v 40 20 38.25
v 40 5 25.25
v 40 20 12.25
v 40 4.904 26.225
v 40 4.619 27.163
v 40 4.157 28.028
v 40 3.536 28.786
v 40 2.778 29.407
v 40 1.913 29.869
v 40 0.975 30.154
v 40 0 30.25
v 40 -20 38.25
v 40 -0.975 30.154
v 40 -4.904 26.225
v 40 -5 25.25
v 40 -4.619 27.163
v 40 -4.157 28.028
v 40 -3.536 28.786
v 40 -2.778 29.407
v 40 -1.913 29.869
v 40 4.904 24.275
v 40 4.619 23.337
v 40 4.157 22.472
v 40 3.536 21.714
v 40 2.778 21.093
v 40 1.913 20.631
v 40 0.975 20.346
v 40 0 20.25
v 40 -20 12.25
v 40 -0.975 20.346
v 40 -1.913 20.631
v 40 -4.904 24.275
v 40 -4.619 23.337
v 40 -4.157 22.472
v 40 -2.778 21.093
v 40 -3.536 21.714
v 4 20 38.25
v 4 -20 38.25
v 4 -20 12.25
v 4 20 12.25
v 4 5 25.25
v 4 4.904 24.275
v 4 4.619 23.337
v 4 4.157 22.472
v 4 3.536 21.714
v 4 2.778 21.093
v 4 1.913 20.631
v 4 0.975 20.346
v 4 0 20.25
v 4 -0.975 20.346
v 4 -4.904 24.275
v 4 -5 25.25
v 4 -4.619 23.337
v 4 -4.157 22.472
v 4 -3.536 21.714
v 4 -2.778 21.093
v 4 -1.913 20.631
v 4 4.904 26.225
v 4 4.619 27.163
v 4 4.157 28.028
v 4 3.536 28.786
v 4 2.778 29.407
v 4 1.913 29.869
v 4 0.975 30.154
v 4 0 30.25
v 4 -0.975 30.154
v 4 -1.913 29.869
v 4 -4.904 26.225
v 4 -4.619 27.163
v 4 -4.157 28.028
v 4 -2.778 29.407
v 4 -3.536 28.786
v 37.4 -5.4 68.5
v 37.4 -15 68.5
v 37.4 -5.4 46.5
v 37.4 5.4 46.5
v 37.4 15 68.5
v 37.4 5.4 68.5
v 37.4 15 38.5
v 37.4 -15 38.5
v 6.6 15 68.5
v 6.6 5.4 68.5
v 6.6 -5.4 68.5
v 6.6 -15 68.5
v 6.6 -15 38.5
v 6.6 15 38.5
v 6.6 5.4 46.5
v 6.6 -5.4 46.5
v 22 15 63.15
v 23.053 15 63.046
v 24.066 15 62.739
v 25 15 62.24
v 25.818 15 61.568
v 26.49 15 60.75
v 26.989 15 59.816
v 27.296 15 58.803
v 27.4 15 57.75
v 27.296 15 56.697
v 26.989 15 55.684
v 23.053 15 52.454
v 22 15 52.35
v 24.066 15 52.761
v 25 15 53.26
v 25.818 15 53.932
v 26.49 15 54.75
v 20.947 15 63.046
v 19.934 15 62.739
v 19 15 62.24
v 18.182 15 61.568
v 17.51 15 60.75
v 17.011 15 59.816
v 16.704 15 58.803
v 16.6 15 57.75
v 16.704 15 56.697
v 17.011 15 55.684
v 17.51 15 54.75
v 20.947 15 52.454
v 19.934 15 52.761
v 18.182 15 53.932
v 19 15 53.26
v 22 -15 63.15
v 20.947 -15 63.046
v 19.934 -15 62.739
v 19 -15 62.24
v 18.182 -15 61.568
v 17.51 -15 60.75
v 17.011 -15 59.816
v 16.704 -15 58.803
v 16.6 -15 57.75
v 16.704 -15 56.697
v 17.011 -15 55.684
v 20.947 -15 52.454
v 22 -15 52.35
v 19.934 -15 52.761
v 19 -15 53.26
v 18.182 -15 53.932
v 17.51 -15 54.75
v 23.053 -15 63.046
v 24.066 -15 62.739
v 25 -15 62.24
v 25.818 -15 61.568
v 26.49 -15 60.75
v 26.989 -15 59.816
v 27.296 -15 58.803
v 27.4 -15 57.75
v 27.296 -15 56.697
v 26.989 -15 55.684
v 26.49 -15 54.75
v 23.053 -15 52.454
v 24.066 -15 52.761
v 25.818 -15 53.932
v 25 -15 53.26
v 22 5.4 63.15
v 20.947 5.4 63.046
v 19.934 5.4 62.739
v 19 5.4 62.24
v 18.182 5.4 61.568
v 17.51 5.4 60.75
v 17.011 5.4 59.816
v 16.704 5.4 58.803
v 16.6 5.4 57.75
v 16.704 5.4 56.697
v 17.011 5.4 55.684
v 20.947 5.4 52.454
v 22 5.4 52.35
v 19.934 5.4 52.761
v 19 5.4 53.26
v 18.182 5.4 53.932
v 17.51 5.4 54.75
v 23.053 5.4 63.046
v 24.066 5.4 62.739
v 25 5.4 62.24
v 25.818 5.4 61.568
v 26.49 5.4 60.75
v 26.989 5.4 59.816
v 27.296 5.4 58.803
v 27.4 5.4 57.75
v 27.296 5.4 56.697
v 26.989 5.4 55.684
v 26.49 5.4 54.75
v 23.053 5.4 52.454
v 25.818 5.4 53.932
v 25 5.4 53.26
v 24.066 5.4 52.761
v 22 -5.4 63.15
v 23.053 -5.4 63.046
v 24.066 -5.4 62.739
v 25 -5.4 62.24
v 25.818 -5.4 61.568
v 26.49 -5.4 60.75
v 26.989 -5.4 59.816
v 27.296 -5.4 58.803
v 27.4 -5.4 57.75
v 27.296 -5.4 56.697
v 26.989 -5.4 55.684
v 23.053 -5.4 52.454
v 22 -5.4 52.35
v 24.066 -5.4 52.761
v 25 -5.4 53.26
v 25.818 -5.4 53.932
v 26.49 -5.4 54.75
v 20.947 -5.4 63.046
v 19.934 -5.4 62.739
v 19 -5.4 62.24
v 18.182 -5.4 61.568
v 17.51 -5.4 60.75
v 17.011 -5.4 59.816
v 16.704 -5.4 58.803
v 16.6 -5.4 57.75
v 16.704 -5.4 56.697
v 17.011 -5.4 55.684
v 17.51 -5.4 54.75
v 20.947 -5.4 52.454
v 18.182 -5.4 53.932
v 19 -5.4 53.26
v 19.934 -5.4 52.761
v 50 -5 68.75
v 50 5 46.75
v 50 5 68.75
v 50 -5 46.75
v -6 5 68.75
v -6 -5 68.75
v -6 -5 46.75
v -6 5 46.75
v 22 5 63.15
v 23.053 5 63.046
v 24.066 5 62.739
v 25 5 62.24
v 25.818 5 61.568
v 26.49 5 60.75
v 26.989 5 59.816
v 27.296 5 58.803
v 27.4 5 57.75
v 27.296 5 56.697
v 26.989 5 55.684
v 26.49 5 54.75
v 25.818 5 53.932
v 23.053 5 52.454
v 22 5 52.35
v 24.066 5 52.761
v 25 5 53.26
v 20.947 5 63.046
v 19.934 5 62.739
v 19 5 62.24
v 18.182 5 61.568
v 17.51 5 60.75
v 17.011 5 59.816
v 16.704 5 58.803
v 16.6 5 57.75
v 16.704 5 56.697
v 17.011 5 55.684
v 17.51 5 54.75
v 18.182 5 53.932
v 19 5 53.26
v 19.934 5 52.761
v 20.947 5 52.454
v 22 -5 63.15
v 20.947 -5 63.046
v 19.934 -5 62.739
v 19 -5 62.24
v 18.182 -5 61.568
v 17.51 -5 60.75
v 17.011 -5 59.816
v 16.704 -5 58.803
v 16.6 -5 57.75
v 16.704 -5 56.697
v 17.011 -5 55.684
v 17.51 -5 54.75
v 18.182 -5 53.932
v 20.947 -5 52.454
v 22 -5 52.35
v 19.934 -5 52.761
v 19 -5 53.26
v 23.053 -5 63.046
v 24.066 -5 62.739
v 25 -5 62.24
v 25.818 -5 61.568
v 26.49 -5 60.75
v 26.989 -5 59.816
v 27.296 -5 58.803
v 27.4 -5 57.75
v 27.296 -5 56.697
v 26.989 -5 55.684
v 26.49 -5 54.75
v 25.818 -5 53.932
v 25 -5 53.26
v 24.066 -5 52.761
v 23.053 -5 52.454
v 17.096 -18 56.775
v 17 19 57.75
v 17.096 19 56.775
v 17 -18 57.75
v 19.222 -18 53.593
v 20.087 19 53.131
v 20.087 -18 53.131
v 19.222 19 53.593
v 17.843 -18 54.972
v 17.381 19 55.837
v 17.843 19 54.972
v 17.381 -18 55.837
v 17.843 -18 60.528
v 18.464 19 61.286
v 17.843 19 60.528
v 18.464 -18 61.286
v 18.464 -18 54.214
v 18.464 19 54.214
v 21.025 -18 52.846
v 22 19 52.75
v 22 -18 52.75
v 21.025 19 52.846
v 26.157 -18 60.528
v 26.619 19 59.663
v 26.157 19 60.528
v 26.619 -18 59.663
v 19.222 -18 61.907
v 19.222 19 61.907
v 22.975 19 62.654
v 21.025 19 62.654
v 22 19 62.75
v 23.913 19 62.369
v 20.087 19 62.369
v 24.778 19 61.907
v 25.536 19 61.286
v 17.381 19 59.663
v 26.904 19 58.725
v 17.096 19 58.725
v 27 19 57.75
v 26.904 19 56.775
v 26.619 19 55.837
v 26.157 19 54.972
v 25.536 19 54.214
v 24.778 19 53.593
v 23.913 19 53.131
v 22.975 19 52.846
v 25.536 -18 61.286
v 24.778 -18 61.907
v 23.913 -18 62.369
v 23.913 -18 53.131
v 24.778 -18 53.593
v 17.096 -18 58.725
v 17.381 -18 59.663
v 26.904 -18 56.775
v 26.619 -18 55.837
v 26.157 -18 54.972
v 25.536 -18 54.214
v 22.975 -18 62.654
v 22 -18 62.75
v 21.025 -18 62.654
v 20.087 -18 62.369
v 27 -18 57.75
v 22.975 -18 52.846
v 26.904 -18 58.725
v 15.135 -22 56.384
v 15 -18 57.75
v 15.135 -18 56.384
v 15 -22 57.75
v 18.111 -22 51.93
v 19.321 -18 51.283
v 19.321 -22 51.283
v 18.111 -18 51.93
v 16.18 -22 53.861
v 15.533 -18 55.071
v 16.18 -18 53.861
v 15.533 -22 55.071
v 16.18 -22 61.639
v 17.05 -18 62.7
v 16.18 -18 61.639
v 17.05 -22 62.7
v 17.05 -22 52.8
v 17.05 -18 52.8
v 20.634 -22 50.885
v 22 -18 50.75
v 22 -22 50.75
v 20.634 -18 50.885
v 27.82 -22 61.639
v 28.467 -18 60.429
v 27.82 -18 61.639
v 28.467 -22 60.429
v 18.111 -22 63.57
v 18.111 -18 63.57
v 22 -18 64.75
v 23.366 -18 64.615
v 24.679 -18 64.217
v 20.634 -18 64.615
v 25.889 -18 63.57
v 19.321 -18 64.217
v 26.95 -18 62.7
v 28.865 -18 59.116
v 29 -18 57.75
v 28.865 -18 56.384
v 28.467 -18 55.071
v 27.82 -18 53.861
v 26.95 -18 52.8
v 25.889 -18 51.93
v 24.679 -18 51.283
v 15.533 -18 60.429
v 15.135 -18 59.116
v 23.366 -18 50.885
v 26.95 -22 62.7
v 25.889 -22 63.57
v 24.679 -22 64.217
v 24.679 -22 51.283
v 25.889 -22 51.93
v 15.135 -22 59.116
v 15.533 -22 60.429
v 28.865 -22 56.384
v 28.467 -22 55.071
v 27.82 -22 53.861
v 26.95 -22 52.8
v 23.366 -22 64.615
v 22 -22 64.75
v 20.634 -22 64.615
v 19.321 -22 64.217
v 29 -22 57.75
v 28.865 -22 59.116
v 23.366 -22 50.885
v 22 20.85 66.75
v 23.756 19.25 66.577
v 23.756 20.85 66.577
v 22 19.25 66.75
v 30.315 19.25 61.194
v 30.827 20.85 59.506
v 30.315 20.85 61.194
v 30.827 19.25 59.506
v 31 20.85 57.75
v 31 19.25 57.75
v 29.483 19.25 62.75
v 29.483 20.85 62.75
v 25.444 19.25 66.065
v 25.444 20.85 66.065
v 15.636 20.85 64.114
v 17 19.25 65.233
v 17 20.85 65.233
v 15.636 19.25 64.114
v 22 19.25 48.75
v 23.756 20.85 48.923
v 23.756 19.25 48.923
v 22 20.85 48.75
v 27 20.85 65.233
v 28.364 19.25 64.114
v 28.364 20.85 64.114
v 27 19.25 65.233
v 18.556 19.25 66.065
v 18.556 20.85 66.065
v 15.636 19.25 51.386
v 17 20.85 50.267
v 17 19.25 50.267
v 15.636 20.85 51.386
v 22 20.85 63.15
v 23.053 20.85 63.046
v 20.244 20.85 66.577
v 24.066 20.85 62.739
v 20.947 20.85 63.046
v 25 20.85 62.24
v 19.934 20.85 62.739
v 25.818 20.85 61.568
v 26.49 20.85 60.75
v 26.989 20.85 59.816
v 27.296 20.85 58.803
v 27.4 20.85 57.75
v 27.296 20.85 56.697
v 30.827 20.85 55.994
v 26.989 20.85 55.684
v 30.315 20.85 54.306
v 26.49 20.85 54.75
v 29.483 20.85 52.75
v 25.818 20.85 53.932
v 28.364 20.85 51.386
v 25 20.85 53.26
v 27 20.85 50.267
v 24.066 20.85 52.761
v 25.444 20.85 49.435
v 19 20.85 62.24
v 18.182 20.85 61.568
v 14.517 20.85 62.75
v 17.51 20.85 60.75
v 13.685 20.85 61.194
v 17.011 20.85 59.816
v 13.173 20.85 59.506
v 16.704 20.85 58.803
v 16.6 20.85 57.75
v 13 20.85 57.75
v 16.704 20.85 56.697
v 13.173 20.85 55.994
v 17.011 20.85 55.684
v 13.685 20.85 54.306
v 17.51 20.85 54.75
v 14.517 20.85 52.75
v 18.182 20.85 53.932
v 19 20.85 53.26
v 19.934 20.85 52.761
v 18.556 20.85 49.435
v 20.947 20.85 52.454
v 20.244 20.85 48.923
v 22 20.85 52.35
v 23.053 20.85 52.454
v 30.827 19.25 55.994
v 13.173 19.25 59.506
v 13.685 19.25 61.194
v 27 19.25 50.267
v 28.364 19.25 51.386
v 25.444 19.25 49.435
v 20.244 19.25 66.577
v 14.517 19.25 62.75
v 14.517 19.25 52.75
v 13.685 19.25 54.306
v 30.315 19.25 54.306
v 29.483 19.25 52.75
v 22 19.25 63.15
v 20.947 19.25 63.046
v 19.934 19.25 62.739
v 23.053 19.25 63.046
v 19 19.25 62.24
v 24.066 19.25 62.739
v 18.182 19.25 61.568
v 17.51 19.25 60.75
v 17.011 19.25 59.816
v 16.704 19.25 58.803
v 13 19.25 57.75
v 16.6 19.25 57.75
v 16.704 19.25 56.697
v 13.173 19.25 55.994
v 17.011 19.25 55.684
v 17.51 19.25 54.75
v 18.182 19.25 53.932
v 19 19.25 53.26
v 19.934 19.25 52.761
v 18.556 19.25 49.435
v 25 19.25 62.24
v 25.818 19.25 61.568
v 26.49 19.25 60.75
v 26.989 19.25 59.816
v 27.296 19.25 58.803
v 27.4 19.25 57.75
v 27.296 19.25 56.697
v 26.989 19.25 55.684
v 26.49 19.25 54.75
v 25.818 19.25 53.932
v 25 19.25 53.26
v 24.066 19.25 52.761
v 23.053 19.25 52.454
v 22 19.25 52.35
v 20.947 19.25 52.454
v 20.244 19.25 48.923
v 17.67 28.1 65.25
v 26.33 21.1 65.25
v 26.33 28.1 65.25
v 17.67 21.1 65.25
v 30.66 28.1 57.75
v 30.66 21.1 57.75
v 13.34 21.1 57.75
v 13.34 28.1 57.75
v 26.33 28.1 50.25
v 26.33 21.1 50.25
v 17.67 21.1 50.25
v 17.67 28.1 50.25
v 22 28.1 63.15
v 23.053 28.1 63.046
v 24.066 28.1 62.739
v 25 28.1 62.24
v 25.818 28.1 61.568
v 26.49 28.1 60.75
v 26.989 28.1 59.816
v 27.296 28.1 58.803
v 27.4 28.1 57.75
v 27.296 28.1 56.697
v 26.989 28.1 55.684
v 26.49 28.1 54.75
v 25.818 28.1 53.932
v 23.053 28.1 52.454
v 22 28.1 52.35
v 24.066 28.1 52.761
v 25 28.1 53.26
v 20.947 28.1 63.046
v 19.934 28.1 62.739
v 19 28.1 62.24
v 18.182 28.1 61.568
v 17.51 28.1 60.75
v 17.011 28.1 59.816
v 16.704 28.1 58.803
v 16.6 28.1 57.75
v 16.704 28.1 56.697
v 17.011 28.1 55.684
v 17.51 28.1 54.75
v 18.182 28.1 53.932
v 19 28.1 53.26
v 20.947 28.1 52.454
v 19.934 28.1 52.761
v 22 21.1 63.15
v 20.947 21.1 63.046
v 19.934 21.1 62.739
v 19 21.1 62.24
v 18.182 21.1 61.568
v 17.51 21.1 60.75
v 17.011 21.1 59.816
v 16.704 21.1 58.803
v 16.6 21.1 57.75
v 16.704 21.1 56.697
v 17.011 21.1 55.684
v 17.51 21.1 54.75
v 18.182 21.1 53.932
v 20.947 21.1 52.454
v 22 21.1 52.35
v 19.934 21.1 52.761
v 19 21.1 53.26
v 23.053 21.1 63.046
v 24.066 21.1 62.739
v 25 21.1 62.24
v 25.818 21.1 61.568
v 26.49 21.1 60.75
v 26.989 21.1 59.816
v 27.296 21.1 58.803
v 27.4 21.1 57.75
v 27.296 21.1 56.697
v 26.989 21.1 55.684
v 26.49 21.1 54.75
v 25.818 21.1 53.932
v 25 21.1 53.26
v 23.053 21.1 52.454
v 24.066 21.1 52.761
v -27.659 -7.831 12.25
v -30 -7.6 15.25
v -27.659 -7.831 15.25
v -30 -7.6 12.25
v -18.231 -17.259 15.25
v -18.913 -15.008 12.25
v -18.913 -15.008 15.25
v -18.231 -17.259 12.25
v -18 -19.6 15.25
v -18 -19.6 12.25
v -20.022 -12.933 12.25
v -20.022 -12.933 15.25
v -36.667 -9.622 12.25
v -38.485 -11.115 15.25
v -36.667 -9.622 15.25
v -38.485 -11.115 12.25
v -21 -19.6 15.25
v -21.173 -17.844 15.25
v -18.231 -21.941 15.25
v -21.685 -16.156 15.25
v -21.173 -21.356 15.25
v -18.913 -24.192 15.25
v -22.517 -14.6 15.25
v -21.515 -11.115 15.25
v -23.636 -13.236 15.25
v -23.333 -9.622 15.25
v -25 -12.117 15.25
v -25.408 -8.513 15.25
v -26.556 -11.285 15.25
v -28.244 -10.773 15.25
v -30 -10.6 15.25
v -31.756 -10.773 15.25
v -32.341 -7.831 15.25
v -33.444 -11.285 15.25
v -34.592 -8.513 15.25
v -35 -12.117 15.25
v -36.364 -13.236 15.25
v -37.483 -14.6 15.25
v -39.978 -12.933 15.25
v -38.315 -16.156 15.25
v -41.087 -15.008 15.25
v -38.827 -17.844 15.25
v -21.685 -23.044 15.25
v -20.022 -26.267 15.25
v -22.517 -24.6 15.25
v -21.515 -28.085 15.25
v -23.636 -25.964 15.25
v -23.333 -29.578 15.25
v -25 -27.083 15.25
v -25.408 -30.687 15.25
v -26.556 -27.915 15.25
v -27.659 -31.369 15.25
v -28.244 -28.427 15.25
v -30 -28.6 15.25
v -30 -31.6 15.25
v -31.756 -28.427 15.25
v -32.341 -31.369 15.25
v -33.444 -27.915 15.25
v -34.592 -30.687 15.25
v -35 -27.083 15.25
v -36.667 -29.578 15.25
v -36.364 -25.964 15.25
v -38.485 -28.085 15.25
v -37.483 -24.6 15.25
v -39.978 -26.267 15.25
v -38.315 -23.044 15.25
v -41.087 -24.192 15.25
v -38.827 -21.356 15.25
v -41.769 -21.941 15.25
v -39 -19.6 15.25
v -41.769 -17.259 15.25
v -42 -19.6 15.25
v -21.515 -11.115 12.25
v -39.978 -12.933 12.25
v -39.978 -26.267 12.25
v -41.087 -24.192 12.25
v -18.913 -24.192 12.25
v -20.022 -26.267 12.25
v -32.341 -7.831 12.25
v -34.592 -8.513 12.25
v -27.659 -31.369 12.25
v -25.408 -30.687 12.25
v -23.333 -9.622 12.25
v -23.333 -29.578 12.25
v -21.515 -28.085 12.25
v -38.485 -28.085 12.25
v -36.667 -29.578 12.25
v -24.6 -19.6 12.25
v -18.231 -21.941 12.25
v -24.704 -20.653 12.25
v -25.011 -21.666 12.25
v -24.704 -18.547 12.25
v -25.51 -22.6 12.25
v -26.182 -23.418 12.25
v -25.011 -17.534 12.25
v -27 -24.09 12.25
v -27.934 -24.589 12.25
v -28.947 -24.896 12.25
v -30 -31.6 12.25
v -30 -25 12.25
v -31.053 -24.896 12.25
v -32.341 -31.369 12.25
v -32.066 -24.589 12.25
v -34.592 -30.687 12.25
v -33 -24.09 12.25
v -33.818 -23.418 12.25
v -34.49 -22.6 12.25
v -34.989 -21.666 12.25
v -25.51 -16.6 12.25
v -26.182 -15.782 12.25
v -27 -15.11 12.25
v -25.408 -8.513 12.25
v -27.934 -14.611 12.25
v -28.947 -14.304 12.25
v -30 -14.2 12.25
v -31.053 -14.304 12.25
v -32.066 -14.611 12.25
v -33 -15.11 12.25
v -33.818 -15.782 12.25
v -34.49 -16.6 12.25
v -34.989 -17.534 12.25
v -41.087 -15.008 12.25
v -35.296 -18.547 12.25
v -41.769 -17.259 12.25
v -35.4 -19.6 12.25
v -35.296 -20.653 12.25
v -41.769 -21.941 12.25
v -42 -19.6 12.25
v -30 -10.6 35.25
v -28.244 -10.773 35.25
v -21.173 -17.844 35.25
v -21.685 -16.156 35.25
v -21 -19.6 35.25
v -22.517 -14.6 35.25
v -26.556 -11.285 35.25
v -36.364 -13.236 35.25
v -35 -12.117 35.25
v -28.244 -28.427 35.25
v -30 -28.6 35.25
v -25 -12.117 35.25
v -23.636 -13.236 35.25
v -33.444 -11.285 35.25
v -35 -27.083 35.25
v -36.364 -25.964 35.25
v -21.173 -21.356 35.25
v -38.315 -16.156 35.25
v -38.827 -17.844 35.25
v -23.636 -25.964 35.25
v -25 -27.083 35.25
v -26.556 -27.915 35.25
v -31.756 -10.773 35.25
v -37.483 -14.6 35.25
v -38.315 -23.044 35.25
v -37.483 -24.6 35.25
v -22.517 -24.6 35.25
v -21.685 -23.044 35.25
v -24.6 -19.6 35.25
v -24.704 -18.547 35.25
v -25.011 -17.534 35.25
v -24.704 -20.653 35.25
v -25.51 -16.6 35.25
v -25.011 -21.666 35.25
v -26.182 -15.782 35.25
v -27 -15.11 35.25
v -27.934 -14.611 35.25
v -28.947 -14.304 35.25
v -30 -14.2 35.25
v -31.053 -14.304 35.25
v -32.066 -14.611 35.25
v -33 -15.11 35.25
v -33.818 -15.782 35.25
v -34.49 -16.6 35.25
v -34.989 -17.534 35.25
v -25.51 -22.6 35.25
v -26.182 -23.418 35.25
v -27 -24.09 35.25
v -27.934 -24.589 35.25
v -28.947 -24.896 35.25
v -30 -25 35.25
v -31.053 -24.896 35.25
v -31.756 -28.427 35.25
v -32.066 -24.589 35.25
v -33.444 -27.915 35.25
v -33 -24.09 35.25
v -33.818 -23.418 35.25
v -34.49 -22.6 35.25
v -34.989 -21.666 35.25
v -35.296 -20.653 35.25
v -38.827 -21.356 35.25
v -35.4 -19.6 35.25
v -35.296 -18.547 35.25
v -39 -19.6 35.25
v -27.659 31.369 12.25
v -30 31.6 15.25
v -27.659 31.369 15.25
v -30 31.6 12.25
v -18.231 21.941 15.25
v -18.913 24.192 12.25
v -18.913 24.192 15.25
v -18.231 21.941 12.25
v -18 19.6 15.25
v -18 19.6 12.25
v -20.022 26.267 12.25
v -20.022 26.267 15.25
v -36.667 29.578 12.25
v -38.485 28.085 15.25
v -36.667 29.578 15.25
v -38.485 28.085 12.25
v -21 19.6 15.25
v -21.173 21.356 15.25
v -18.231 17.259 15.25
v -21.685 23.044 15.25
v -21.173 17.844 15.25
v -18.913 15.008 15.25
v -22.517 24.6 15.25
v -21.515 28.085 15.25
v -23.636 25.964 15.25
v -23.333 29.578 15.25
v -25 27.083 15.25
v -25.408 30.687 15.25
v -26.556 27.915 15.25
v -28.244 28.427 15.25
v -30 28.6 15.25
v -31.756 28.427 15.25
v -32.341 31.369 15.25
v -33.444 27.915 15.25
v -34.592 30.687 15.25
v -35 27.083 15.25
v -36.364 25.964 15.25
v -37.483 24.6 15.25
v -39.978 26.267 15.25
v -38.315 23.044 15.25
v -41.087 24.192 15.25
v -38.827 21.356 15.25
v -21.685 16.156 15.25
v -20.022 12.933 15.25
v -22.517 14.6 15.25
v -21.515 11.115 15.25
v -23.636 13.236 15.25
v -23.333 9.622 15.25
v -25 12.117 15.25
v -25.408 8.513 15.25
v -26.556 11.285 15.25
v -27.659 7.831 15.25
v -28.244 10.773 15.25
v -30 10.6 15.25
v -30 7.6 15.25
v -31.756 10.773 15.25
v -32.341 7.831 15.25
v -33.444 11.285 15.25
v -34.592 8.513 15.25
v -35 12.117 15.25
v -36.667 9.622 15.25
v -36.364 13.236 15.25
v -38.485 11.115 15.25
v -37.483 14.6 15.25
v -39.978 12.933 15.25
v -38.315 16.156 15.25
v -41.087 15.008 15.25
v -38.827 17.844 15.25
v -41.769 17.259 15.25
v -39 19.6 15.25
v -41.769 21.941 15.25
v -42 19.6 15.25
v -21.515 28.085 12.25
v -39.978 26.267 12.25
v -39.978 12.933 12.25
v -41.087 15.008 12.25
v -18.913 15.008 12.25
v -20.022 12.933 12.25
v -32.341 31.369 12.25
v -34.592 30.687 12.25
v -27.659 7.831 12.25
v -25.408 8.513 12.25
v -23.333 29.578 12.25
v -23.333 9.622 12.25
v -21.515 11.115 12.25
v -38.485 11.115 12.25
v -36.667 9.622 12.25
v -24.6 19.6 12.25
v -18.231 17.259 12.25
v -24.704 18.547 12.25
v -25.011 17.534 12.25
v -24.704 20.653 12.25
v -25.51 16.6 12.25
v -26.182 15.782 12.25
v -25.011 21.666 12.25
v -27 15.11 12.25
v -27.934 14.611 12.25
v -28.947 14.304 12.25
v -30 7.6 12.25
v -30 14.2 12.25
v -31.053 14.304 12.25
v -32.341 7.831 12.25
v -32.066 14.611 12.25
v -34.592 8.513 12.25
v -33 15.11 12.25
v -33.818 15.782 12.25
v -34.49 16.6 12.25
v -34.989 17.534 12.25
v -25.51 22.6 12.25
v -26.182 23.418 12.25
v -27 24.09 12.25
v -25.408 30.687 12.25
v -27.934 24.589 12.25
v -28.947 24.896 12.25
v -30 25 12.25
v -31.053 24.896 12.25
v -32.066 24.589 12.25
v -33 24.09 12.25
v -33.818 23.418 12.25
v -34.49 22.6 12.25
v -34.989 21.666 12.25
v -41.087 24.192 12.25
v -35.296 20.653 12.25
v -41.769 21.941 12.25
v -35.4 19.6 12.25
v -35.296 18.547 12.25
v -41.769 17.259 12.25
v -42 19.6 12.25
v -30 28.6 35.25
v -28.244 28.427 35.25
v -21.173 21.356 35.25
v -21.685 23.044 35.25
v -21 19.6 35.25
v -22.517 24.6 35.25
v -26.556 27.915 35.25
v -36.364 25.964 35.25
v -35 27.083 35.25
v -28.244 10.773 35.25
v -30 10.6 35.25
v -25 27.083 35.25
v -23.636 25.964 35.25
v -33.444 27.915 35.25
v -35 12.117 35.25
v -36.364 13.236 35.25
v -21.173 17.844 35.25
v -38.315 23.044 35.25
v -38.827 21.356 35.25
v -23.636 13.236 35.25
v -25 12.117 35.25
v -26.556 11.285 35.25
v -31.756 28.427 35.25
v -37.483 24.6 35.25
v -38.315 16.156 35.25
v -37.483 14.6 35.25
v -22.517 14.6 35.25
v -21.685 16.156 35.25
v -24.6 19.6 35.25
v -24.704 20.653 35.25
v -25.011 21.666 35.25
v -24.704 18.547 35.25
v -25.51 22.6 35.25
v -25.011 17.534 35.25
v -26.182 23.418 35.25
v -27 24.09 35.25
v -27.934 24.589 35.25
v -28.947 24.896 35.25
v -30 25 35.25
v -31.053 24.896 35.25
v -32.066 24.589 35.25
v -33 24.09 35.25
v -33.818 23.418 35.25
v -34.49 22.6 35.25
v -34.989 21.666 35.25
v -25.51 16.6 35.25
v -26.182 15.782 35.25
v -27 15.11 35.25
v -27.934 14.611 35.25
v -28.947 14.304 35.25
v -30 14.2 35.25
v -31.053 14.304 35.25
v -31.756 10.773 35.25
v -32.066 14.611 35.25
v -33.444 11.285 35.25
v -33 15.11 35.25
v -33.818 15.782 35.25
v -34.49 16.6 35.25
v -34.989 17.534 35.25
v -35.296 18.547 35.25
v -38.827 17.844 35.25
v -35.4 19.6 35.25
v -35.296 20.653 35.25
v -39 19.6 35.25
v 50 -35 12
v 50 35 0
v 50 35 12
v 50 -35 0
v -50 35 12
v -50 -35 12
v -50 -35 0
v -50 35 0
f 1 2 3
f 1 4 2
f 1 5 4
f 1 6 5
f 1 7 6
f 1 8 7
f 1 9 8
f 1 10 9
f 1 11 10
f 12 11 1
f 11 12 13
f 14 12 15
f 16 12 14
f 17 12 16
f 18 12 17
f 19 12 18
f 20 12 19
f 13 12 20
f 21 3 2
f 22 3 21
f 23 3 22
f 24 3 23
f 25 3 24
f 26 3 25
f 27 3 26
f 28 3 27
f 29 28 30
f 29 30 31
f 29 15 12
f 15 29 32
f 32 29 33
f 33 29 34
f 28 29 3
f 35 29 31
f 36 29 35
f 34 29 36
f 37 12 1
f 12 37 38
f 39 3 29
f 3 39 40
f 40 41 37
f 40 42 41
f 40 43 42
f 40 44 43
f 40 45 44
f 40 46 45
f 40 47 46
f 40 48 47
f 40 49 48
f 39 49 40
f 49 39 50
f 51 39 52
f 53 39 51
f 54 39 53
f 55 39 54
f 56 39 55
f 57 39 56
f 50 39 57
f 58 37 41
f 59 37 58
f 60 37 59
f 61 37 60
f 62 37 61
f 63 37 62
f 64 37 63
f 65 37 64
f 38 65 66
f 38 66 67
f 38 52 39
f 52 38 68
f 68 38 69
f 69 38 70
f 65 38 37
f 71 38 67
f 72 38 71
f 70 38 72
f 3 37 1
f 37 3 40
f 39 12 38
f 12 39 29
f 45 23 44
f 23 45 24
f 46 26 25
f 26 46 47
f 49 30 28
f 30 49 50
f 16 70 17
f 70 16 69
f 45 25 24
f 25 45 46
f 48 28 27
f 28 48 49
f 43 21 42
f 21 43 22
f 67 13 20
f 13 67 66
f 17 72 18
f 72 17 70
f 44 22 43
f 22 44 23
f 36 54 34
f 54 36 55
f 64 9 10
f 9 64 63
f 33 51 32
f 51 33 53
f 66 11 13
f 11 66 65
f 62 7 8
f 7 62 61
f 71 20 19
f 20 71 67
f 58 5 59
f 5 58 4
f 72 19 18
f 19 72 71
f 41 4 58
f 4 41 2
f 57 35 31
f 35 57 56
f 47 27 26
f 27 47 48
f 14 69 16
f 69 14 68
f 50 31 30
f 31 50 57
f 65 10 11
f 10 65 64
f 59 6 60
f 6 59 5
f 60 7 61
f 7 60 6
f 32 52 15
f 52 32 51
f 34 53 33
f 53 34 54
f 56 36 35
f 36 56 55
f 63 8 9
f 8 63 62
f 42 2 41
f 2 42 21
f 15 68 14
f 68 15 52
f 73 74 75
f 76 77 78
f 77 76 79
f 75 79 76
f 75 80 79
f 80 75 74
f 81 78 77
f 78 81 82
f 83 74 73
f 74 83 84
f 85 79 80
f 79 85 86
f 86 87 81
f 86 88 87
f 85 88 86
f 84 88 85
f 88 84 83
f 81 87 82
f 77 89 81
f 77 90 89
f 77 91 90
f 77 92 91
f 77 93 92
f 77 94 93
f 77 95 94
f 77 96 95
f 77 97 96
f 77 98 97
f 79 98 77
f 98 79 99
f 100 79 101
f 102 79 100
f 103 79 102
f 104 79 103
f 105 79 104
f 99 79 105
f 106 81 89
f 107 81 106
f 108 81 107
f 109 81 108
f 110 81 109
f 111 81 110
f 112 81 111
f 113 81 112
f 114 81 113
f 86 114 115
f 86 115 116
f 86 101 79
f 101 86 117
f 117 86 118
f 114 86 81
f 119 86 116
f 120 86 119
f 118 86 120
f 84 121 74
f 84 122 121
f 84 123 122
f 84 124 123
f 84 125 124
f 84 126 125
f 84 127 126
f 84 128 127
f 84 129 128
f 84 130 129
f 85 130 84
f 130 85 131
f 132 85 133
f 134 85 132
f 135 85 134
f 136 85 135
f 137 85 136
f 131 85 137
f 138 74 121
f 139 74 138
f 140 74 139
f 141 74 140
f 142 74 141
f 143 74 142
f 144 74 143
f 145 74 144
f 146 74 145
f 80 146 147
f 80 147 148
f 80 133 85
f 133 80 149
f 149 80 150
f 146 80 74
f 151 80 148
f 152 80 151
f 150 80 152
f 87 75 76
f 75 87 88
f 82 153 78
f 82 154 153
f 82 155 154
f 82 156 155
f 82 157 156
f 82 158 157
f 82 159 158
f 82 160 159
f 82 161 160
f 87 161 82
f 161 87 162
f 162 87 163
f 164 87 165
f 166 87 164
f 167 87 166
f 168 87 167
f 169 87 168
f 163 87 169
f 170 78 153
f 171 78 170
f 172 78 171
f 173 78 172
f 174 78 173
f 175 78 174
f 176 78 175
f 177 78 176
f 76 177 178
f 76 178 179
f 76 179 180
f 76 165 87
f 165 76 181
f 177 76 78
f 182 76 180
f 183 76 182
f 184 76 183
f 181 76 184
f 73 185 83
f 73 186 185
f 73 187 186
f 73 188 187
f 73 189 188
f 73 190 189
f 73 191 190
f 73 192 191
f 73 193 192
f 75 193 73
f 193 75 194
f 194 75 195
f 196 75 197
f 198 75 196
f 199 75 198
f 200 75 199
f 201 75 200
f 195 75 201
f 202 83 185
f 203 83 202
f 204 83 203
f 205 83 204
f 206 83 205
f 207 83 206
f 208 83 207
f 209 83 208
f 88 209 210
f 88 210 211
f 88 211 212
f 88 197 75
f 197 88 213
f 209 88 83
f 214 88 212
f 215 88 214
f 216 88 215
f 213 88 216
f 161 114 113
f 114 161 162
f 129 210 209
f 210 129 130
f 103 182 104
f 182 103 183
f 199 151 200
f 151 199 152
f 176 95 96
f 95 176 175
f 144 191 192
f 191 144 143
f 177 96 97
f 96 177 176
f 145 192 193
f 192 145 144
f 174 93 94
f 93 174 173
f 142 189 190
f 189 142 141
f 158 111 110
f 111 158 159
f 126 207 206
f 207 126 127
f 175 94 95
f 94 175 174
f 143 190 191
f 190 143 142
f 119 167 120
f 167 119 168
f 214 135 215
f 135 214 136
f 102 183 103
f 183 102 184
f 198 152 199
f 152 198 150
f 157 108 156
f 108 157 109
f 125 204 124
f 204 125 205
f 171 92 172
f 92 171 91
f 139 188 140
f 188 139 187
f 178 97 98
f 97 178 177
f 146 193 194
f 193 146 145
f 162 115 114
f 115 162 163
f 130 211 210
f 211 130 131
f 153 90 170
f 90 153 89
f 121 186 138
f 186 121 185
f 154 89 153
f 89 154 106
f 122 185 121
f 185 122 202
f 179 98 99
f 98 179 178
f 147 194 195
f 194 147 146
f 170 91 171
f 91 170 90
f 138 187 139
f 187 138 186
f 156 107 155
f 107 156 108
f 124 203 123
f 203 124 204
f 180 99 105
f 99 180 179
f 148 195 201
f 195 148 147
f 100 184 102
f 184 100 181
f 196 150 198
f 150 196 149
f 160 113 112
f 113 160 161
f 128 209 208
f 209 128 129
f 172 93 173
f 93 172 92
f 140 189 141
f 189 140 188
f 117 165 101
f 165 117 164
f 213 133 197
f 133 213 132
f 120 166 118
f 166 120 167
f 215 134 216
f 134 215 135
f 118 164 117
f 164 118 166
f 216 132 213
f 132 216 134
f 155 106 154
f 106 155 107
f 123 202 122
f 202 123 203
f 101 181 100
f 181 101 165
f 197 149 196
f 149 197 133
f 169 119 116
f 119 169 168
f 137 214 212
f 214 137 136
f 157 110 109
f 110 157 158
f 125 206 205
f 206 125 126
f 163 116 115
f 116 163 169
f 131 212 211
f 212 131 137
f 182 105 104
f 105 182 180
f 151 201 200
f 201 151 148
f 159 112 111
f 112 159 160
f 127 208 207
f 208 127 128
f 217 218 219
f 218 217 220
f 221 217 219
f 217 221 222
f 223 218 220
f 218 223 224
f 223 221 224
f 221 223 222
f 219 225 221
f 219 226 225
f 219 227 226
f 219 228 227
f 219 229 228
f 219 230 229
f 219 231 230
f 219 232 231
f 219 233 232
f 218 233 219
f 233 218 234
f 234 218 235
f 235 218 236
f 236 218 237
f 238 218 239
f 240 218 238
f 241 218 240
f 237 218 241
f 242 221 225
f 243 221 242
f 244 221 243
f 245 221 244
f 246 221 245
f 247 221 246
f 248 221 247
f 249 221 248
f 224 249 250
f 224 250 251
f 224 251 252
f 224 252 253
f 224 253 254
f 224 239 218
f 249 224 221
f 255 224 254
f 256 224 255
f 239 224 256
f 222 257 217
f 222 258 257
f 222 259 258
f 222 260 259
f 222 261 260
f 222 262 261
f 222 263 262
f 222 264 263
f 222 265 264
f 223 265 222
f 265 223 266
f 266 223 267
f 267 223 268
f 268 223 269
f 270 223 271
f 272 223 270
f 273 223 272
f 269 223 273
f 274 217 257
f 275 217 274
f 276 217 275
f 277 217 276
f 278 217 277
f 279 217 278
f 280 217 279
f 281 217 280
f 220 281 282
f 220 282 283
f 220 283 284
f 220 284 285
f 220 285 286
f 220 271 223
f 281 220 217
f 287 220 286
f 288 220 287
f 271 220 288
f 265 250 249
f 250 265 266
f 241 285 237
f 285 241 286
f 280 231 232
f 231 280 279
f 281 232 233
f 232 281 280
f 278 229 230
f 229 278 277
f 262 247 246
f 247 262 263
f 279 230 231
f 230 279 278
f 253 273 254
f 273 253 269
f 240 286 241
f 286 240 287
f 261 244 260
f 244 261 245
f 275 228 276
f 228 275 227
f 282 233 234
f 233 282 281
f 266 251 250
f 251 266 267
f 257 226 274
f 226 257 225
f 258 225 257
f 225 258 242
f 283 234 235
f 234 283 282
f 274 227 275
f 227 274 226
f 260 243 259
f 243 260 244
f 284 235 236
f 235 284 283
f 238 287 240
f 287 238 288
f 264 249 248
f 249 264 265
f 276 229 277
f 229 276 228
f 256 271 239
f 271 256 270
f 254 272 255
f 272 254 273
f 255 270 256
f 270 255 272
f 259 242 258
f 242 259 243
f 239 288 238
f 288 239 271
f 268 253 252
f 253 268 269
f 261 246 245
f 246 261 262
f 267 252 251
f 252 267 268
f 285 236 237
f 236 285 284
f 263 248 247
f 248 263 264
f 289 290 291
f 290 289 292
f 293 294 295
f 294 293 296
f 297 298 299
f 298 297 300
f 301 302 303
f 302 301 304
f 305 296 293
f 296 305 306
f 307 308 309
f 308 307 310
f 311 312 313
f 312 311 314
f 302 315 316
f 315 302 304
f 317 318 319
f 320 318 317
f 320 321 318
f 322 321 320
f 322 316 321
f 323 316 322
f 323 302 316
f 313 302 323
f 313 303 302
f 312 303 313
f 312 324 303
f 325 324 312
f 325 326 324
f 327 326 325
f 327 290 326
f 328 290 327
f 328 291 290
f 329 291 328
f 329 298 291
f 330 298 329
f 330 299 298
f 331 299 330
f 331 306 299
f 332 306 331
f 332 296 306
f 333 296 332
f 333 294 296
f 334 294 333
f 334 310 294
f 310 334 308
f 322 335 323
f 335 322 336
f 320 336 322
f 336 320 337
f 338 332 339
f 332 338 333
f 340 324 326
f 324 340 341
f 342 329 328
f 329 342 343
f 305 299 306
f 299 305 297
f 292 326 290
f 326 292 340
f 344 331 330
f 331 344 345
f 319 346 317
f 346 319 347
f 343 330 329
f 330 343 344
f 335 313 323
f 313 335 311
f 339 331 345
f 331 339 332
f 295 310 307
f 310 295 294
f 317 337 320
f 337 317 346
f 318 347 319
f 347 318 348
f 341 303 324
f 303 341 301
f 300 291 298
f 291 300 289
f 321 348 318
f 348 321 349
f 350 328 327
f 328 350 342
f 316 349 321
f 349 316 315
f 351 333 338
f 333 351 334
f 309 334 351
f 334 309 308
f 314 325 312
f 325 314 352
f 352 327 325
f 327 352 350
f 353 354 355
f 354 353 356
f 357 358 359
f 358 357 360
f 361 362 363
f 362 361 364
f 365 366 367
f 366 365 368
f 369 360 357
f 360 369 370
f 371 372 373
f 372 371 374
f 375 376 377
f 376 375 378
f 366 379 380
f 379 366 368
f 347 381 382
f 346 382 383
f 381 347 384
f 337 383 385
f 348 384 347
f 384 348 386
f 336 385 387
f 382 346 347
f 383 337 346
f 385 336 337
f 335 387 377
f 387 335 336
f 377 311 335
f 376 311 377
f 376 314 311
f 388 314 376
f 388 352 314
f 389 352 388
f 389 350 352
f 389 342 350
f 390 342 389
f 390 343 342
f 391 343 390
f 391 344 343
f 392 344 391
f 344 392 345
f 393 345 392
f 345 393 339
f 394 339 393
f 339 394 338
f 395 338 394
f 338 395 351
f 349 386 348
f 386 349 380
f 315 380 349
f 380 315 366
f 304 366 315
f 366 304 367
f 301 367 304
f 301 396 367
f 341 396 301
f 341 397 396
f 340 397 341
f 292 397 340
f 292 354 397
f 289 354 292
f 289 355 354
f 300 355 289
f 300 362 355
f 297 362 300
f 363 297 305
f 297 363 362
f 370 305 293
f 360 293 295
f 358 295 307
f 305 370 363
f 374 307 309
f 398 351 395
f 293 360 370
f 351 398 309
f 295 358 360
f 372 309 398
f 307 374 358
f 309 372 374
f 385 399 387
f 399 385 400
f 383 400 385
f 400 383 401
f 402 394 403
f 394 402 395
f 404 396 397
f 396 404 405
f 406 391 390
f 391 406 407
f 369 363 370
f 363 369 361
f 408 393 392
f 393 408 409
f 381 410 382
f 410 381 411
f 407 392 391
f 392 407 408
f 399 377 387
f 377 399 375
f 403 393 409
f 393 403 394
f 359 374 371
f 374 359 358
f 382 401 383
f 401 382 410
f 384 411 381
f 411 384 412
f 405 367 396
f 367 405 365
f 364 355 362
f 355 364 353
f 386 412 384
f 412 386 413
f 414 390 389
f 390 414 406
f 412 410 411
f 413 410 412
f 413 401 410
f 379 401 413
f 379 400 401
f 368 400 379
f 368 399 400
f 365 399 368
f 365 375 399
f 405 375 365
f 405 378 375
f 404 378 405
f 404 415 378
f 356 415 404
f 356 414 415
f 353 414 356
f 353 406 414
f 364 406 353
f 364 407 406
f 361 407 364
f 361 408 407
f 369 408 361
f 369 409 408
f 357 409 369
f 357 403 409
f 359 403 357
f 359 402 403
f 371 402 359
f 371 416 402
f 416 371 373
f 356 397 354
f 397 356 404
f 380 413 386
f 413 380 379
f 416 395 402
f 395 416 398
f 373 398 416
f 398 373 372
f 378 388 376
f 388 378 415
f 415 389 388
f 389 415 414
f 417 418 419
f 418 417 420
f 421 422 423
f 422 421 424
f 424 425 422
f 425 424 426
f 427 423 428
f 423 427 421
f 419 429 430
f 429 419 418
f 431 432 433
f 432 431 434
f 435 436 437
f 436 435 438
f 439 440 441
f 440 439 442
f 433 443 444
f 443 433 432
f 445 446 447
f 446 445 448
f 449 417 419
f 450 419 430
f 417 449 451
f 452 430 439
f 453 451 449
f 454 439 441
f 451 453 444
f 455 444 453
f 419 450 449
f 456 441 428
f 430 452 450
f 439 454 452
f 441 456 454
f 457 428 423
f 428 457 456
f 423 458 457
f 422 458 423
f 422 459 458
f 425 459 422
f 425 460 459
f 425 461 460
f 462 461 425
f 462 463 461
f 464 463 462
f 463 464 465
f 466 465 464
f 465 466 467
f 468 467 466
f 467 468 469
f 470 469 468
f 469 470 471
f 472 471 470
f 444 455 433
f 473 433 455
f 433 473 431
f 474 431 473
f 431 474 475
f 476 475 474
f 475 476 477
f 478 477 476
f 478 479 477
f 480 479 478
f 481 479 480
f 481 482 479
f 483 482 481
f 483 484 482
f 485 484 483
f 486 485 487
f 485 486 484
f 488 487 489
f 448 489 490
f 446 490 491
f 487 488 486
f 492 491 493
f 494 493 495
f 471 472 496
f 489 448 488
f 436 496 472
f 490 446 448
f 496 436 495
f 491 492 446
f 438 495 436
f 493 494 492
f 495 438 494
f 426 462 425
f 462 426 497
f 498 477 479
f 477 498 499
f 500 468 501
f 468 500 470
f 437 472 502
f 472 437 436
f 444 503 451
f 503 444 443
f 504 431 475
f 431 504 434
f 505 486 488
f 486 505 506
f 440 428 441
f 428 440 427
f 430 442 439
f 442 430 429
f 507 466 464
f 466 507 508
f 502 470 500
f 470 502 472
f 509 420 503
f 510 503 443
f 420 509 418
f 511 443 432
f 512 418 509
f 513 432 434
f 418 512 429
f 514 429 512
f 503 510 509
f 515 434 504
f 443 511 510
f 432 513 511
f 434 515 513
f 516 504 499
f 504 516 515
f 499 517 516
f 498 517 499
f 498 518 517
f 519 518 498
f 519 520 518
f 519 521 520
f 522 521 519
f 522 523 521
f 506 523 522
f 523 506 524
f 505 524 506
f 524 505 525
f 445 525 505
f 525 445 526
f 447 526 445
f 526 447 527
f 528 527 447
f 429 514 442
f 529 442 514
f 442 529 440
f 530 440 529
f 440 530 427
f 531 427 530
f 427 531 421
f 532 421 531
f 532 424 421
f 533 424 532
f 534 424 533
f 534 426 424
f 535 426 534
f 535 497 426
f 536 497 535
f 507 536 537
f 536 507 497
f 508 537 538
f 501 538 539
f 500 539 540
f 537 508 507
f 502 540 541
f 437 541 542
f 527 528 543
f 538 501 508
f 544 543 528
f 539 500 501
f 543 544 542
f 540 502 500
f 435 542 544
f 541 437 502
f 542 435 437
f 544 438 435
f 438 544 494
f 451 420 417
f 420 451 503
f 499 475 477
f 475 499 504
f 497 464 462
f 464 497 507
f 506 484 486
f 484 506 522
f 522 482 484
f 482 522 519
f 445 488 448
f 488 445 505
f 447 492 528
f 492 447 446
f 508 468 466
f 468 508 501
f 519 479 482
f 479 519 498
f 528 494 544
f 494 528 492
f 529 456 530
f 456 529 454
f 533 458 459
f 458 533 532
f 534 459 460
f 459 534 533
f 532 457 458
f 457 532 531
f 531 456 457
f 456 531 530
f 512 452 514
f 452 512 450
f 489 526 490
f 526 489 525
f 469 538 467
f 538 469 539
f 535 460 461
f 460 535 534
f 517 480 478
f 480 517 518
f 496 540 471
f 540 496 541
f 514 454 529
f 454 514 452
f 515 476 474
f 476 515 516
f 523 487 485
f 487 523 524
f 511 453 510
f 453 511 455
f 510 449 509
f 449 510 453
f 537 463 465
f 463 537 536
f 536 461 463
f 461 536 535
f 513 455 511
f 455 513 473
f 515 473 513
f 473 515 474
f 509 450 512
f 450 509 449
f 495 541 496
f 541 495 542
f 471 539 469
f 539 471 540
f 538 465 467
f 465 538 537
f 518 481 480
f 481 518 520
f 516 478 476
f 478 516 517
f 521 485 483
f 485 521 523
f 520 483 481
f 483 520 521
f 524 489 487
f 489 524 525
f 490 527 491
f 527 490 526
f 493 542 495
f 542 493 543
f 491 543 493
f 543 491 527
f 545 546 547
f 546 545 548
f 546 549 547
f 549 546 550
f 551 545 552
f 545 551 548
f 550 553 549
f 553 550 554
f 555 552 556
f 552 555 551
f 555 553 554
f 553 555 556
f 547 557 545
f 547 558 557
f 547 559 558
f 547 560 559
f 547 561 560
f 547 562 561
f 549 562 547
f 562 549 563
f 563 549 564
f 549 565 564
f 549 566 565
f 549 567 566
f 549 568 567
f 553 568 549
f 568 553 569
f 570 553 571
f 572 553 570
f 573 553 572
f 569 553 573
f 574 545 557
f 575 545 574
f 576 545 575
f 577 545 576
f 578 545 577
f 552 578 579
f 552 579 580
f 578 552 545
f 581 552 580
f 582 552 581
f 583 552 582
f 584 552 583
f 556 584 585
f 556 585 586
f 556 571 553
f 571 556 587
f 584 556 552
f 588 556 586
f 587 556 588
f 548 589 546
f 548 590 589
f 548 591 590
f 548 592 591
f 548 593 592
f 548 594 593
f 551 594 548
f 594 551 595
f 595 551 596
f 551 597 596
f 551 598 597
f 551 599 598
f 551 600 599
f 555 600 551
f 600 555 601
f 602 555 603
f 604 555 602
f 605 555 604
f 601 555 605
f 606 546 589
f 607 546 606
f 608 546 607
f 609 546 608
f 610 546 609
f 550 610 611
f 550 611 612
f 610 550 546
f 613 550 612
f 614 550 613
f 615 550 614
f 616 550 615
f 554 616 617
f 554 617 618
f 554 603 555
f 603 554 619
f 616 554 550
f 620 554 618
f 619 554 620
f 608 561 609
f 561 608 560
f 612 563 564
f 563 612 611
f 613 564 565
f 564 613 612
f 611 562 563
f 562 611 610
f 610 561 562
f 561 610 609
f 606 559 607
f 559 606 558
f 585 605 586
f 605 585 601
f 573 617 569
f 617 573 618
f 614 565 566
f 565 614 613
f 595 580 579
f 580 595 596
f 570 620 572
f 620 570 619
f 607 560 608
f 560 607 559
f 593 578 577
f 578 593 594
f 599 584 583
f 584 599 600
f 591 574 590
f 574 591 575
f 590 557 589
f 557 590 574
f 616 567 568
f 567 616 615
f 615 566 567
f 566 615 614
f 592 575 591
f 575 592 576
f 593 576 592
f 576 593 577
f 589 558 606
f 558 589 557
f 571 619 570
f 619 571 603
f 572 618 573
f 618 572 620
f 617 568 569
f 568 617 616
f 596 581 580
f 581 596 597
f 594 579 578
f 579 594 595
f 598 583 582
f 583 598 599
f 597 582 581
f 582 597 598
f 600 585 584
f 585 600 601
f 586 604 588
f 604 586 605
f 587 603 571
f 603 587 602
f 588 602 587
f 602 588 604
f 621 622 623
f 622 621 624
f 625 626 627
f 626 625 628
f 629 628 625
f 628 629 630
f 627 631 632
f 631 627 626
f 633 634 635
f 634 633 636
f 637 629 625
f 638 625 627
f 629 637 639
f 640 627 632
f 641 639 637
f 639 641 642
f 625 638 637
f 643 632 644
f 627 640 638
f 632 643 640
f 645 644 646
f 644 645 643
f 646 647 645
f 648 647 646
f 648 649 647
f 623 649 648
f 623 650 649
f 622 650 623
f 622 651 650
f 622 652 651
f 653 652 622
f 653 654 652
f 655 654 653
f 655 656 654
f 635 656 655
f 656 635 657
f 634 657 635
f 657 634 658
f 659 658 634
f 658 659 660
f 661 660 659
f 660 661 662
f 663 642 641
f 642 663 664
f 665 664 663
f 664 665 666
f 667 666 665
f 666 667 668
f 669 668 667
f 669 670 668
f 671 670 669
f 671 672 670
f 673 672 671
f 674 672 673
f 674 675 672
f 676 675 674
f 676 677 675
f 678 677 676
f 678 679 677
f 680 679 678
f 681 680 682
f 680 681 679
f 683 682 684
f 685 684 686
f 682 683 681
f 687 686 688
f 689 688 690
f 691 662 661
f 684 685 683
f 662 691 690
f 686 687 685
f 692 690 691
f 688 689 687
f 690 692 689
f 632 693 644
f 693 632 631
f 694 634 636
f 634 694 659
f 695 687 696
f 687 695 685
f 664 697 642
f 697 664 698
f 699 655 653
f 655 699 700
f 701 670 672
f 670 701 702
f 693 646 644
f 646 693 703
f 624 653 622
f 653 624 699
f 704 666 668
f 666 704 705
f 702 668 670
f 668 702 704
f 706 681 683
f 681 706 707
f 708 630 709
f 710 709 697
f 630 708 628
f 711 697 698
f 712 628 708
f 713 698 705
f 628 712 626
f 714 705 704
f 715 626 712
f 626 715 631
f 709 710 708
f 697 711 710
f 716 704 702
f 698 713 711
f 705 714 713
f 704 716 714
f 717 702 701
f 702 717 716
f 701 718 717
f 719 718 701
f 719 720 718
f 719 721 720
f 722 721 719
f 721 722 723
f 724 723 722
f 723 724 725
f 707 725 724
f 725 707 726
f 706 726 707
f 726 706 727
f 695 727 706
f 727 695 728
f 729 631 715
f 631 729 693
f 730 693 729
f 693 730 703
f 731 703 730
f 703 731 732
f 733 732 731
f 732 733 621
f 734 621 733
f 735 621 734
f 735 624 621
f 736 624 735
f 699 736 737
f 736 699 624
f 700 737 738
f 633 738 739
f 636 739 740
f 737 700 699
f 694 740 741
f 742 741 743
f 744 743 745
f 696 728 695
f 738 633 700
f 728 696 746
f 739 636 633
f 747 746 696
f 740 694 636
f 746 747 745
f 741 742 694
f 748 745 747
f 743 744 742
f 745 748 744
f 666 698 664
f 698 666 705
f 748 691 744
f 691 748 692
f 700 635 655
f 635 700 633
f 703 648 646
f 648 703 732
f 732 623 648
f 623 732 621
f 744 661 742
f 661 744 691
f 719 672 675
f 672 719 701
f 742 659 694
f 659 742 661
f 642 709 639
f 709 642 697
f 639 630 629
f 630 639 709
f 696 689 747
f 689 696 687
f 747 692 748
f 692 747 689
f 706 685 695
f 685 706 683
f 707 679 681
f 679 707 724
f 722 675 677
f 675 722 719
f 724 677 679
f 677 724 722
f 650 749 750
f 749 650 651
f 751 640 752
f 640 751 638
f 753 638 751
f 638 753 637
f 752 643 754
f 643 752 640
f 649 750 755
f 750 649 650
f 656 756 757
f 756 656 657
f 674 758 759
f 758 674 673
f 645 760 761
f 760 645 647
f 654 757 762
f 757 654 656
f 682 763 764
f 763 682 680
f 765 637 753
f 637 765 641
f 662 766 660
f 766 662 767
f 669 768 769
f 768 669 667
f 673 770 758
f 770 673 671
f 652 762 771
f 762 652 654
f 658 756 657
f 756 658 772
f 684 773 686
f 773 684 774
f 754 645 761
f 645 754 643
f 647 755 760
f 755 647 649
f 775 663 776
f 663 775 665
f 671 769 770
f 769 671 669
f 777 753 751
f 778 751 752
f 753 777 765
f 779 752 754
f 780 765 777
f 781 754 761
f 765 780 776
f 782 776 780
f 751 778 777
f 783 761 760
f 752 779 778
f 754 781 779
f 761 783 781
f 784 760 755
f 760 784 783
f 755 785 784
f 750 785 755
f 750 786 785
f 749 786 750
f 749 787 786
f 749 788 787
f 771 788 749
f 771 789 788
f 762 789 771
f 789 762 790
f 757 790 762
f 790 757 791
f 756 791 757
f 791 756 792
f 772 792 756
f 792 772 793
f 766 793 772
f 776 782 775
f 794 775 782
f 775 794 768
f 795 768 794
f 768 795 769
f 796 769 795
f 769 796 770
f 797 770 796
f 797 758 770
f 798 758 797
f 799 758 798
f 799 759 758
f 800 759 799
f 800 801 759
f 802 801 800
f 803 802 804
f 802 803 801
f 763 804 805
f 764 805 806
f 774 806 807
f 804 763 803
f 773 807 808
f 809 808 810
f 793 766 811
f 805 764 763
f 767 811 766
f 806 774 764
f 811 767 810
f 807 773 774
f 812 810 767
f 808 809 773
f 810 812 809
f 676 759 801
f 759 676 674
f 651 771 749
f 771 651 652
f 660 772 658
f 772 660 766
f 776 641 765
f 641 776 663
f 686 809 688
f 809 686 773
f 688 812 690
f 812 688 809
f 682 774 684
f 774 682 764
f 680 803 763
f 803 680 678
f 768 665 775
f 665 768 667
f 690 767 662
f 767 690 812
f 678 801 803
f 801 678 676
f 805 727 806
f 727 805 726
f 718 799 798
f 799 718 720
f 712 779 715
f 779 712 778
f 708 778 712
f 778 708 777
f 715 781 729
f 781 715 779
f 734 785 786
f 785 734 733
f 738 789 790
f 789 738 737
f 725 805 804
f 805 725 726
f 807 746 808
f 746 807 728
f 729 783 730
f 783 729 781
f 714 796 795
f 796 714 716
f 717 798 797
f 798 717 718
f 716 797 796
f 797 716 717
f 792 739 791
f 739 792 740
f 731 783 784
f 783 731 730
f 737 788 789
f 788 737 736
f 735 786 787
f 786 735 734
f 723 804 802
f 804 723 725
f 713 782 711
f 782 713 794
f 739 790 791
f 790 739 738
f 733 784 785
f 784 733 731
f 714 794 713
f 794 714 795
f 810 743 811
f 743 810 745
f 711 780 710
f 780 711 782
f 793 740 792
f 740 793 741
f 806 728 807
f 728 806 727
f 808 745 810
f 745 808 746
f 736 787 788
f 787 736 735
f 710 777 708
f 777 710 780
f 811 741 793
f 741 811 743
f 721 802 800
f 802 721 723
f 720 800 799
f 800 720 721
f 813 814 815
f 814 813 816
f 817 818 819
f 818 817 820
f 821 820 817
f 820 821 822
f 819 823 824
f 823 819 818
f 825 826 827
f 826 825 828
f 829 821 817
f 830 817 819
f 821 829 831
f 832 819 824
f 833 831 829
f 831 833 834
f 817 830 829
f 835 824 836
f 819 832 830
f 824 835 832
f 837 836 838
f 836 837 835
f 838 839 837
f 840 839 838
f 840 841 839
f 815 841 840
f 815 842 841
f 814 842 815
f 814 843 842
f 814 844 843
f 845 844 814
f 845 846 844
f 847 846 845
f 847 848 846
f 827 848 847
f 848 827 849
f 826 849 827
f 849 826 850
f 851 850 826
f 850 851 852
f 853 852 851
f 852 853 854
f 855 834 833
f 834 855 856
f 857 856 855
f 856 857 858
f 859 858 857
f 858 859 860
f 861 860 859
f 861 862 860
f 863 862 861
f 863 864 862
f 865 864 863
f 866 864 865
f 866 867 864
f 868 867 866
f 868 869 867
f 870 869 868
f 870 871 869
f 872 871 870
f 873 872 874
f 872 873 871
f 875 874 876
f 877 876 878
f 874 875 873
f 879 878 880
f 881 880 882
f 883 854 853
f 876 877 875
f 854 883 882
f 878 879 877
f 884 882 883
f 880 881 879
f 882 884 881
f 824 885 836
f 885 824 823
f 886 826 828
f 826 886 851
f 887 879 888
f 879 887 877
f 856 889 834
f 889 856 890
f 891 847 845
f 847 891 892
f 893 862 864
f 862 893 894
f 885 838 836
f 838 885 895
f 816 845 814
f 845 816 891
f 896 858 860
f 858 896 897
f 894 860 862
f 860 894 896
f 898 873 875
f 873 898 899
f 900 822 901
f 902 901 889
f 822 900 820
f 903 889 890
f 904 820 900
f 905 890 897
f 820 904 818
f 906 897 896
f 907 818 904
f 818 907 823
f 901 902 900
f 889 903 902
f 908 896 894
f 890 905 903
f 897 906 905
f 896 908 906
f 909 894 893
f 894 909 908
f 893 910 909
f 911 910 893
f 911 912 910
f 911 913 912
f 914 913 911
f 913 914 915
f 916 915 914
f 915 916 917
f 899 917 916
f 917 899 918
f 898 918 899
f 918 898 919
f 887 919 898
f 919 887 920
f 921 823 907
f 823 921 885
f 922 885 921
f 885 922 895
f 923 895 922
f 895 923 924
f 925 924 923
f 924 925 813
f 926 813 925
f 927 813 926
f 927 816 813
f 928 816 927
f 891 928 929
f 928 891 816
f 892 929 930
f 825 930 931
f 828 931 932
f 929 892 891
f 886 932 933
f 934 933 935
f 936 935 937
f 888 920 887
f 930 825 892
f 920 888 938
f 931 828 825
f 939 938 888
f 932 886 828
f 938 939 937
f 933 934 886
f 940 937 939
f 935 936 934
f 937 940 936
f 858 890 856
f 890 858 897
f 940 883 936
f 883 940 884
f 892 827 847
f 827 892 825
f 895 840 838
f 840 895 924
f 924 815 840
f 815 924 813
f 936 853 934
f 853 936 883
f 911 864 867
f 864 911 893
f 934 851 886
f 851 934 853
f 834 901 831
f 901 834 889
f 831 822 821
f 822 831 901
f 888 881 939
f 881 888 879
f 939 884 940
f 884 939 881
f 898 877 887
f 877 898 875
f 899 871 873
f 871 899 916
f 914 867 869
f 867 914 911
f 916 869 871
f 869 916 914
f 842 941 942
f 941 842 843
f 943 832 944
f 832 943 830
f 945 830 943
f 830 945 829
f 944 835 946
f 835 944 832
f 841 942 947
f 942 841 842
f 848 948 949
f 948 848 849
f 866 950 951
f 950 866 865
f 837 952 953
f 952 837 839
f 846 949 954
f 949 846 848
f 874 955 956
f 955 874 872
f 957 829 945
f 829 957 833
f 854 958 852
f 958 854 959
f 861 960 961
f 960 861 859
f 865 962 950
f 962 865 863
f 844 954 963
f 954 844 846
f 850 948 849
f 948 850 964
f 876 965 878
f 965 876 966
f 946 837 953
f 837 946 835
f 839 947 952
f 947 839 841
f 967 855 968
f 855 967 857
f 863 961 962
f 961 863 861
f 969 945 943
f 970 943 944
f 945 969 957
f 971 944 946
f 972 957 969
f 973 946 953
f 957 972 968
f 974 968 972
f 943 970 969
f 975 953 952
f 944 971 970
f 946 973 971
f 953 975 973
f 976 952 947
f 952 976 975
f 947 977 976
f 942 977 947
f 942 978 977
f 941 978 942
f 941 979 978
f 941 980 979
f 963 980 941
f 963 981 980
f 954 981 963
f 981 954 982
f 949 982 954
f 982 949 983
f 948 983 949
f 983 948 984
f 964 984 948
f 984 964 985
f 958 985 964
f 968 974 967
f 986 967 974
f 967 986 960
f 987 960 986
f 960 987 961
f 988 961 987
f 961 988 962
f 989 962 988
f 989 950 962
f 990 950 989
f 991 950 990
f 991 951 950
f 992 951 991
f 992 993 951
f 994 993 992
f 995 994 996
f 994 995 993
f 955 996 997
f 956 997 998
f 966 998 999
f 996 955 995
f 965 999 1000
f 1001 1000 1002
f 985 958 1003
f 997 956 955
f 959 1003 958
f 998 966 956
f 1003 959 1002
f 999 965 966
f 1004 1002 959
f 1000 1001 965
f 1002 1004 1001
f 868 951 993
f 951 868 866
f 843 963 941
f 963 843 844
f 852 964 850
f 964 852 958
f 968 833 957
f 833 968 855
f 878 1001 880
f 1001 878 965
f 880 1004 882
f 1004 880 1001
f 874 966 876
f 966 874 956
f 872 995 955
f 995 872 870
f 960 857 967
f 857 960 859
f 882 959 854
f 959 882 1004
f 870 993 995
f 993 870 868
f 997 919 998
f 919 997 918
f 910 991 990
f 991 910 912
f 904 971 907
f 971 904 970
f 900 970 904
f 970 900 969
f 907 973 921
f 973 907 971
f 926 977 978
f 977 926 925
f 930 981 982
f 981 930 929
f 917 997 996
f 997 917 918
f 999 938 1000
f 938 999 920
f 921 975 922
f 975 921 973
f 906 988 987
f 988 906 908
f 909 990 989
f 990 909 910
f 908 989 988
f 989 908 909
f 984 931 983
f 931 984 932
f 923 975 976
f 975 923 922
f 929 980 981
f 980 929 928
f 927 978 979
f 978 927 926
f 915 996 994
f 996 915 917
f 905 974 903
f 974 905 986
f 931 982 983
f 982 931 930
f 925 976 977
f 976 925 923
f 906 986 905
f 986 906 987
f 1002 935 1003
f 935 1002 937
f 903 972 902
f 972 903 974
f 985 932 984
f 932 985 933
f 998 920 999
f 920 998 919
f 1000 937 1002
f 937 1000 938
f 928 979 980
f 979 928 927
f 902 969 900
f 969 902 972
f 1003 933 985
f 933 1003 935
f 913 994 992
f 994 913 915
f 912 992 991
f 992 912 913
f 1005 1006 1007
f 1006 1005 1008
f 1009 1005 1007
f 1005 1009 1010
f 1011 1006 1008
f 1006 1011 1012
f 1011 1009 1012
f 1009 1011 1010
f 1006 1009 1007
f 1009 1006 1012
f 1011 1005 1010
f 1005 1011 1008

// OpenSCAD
$fn = 32;

// ------------------------------------------------------------------------
// Indexing jig: plate 100 x 70 mm, pin d10
// Every part is its own module, assembly() places every instance.
// ------------------------------------------------------------------------

// --- part 1 ---
module jig_plate() {
  difference() {
    translate([-50, -35, 0]) cube([100, 70, 12]);
  }
}

// --- part 2 ---
module locator_block() {
  difference() {
    translate([-18, -20, 0]) cube([36, 40, 26]);
    translate([0, 0, 13]) rotate([0, 90, 0]) cylinder(h = 38, d = 10, center = true);
  }
}

// --- part 3 ---
module index_fork() {
  difference() {
    translate([-15.4, -15, 0]) cube([30.8, 30, 30]);
    translate([-16.4, -5.4, 8]) cube([32.8, 10.8, 23]);
    translate([0, 0, 19.25]) rotate([90, 0, 0]) cylinder(h = 32, d = 10.8, center = true);
  }
}

// --- part 4 ---
module index_arm() {
  difference() {
    translate([-28, -5, 0]) cube([56, 10, 22]);
    translate([0, 0, 11]) rotate([90, 0, 0]) cylinder(h = 12, d = 10.8, center = true);
  }
}

// --- part 5 ---
module index_pin() {
  rotate([0, 90, 0]) cylinder(h = 38, d = 10, center = true);
  translate([-22, 0, 0]) rotate([0, 90, 0]) cylinder(h = 4, d = 14);
}

// --- part 6 ---
module pin_washer() {
  difference() {
      translate([0, 0, 0]) cylinder(h = 1.6, d = 18);
      translate([0, 0, -1]) cylinder(h = 3.6, d = 10.8);
    }
}

// --- part 7 ---
module lock_nut() {
  difference() {
    linear_extrude(height = 7) polygon(points = [[8.66, 0], [4.33, 7.5], [-4.33, 7.5], [-8.66, 0], [-4.33, -7.5], [4.33, -7.5]]);
    translate([0, 0, -1]) cylinder(h = 9, d = 10.8);
  }
}

// --- part 8 ---
module guide_bush_a() {
  difference() {
    union() {
      cylinder(h = 3, d = 24);
      translate([0, 0, 3]) cylinder(h = 20, d = 18);
    }
    translate([0, 0, -1]) cylinder(h = 25, d = 10.8);
  }
}

// --- part 9 ---
module guide_bush_b() {
  difference() {
    union() {
      cylinder(h = 3, d = 24);
      translate([0, 0, 3]) cylinder(h = 20, d = 18);
    }
    translate([0, 0, -1]) cylinder(h = 25, d = 10.8);
  }
}

// --- assembly ---
module assembly() {
  color([0.80, 0.24, 0.20]) translate([0, 0, 0]) rotate([0, 0, 0]) jig_plate();
  color([0.20, 0.45, 0.75]) translate([22, 0, 12.25]) rotate([0, 0, 0]) locator_block();
  color([0.25, 0.62, 0.32]) translate([22, 0, 38.5]) rotate([0, 0, 0]) index_fork();
  color([0.92, 0.70, 0.18]) translate([22, 0, 46.75]) rotate([0, 0, 0]) index_arm();
  color([0.58, 0.35, 0.70]) translate([22, 0, 57.75]) rotate([0, 0, 90]) index_pin();
  color([0.16, 0.66, 0.66]) translate([22, 20.85, 57.75]) rotate([90, 0, 0]) pin_washer();
  color([0.85, 0.48, 0.18]) translate([22, 28.1, 57.75]) rotate([90, 0, 0]) lock_nut();
  color([0.55, 0.60, 0.65]) translate([-30, -19.6, 12.25]) rotate([0, 0, 0]) guide_bush_a();
  color([0.75, 0.30, 0.55]) translate([-30, 19.6, 12.25]) rotate([0, 0, 0]) guide_bush_b();
}

assembly();
